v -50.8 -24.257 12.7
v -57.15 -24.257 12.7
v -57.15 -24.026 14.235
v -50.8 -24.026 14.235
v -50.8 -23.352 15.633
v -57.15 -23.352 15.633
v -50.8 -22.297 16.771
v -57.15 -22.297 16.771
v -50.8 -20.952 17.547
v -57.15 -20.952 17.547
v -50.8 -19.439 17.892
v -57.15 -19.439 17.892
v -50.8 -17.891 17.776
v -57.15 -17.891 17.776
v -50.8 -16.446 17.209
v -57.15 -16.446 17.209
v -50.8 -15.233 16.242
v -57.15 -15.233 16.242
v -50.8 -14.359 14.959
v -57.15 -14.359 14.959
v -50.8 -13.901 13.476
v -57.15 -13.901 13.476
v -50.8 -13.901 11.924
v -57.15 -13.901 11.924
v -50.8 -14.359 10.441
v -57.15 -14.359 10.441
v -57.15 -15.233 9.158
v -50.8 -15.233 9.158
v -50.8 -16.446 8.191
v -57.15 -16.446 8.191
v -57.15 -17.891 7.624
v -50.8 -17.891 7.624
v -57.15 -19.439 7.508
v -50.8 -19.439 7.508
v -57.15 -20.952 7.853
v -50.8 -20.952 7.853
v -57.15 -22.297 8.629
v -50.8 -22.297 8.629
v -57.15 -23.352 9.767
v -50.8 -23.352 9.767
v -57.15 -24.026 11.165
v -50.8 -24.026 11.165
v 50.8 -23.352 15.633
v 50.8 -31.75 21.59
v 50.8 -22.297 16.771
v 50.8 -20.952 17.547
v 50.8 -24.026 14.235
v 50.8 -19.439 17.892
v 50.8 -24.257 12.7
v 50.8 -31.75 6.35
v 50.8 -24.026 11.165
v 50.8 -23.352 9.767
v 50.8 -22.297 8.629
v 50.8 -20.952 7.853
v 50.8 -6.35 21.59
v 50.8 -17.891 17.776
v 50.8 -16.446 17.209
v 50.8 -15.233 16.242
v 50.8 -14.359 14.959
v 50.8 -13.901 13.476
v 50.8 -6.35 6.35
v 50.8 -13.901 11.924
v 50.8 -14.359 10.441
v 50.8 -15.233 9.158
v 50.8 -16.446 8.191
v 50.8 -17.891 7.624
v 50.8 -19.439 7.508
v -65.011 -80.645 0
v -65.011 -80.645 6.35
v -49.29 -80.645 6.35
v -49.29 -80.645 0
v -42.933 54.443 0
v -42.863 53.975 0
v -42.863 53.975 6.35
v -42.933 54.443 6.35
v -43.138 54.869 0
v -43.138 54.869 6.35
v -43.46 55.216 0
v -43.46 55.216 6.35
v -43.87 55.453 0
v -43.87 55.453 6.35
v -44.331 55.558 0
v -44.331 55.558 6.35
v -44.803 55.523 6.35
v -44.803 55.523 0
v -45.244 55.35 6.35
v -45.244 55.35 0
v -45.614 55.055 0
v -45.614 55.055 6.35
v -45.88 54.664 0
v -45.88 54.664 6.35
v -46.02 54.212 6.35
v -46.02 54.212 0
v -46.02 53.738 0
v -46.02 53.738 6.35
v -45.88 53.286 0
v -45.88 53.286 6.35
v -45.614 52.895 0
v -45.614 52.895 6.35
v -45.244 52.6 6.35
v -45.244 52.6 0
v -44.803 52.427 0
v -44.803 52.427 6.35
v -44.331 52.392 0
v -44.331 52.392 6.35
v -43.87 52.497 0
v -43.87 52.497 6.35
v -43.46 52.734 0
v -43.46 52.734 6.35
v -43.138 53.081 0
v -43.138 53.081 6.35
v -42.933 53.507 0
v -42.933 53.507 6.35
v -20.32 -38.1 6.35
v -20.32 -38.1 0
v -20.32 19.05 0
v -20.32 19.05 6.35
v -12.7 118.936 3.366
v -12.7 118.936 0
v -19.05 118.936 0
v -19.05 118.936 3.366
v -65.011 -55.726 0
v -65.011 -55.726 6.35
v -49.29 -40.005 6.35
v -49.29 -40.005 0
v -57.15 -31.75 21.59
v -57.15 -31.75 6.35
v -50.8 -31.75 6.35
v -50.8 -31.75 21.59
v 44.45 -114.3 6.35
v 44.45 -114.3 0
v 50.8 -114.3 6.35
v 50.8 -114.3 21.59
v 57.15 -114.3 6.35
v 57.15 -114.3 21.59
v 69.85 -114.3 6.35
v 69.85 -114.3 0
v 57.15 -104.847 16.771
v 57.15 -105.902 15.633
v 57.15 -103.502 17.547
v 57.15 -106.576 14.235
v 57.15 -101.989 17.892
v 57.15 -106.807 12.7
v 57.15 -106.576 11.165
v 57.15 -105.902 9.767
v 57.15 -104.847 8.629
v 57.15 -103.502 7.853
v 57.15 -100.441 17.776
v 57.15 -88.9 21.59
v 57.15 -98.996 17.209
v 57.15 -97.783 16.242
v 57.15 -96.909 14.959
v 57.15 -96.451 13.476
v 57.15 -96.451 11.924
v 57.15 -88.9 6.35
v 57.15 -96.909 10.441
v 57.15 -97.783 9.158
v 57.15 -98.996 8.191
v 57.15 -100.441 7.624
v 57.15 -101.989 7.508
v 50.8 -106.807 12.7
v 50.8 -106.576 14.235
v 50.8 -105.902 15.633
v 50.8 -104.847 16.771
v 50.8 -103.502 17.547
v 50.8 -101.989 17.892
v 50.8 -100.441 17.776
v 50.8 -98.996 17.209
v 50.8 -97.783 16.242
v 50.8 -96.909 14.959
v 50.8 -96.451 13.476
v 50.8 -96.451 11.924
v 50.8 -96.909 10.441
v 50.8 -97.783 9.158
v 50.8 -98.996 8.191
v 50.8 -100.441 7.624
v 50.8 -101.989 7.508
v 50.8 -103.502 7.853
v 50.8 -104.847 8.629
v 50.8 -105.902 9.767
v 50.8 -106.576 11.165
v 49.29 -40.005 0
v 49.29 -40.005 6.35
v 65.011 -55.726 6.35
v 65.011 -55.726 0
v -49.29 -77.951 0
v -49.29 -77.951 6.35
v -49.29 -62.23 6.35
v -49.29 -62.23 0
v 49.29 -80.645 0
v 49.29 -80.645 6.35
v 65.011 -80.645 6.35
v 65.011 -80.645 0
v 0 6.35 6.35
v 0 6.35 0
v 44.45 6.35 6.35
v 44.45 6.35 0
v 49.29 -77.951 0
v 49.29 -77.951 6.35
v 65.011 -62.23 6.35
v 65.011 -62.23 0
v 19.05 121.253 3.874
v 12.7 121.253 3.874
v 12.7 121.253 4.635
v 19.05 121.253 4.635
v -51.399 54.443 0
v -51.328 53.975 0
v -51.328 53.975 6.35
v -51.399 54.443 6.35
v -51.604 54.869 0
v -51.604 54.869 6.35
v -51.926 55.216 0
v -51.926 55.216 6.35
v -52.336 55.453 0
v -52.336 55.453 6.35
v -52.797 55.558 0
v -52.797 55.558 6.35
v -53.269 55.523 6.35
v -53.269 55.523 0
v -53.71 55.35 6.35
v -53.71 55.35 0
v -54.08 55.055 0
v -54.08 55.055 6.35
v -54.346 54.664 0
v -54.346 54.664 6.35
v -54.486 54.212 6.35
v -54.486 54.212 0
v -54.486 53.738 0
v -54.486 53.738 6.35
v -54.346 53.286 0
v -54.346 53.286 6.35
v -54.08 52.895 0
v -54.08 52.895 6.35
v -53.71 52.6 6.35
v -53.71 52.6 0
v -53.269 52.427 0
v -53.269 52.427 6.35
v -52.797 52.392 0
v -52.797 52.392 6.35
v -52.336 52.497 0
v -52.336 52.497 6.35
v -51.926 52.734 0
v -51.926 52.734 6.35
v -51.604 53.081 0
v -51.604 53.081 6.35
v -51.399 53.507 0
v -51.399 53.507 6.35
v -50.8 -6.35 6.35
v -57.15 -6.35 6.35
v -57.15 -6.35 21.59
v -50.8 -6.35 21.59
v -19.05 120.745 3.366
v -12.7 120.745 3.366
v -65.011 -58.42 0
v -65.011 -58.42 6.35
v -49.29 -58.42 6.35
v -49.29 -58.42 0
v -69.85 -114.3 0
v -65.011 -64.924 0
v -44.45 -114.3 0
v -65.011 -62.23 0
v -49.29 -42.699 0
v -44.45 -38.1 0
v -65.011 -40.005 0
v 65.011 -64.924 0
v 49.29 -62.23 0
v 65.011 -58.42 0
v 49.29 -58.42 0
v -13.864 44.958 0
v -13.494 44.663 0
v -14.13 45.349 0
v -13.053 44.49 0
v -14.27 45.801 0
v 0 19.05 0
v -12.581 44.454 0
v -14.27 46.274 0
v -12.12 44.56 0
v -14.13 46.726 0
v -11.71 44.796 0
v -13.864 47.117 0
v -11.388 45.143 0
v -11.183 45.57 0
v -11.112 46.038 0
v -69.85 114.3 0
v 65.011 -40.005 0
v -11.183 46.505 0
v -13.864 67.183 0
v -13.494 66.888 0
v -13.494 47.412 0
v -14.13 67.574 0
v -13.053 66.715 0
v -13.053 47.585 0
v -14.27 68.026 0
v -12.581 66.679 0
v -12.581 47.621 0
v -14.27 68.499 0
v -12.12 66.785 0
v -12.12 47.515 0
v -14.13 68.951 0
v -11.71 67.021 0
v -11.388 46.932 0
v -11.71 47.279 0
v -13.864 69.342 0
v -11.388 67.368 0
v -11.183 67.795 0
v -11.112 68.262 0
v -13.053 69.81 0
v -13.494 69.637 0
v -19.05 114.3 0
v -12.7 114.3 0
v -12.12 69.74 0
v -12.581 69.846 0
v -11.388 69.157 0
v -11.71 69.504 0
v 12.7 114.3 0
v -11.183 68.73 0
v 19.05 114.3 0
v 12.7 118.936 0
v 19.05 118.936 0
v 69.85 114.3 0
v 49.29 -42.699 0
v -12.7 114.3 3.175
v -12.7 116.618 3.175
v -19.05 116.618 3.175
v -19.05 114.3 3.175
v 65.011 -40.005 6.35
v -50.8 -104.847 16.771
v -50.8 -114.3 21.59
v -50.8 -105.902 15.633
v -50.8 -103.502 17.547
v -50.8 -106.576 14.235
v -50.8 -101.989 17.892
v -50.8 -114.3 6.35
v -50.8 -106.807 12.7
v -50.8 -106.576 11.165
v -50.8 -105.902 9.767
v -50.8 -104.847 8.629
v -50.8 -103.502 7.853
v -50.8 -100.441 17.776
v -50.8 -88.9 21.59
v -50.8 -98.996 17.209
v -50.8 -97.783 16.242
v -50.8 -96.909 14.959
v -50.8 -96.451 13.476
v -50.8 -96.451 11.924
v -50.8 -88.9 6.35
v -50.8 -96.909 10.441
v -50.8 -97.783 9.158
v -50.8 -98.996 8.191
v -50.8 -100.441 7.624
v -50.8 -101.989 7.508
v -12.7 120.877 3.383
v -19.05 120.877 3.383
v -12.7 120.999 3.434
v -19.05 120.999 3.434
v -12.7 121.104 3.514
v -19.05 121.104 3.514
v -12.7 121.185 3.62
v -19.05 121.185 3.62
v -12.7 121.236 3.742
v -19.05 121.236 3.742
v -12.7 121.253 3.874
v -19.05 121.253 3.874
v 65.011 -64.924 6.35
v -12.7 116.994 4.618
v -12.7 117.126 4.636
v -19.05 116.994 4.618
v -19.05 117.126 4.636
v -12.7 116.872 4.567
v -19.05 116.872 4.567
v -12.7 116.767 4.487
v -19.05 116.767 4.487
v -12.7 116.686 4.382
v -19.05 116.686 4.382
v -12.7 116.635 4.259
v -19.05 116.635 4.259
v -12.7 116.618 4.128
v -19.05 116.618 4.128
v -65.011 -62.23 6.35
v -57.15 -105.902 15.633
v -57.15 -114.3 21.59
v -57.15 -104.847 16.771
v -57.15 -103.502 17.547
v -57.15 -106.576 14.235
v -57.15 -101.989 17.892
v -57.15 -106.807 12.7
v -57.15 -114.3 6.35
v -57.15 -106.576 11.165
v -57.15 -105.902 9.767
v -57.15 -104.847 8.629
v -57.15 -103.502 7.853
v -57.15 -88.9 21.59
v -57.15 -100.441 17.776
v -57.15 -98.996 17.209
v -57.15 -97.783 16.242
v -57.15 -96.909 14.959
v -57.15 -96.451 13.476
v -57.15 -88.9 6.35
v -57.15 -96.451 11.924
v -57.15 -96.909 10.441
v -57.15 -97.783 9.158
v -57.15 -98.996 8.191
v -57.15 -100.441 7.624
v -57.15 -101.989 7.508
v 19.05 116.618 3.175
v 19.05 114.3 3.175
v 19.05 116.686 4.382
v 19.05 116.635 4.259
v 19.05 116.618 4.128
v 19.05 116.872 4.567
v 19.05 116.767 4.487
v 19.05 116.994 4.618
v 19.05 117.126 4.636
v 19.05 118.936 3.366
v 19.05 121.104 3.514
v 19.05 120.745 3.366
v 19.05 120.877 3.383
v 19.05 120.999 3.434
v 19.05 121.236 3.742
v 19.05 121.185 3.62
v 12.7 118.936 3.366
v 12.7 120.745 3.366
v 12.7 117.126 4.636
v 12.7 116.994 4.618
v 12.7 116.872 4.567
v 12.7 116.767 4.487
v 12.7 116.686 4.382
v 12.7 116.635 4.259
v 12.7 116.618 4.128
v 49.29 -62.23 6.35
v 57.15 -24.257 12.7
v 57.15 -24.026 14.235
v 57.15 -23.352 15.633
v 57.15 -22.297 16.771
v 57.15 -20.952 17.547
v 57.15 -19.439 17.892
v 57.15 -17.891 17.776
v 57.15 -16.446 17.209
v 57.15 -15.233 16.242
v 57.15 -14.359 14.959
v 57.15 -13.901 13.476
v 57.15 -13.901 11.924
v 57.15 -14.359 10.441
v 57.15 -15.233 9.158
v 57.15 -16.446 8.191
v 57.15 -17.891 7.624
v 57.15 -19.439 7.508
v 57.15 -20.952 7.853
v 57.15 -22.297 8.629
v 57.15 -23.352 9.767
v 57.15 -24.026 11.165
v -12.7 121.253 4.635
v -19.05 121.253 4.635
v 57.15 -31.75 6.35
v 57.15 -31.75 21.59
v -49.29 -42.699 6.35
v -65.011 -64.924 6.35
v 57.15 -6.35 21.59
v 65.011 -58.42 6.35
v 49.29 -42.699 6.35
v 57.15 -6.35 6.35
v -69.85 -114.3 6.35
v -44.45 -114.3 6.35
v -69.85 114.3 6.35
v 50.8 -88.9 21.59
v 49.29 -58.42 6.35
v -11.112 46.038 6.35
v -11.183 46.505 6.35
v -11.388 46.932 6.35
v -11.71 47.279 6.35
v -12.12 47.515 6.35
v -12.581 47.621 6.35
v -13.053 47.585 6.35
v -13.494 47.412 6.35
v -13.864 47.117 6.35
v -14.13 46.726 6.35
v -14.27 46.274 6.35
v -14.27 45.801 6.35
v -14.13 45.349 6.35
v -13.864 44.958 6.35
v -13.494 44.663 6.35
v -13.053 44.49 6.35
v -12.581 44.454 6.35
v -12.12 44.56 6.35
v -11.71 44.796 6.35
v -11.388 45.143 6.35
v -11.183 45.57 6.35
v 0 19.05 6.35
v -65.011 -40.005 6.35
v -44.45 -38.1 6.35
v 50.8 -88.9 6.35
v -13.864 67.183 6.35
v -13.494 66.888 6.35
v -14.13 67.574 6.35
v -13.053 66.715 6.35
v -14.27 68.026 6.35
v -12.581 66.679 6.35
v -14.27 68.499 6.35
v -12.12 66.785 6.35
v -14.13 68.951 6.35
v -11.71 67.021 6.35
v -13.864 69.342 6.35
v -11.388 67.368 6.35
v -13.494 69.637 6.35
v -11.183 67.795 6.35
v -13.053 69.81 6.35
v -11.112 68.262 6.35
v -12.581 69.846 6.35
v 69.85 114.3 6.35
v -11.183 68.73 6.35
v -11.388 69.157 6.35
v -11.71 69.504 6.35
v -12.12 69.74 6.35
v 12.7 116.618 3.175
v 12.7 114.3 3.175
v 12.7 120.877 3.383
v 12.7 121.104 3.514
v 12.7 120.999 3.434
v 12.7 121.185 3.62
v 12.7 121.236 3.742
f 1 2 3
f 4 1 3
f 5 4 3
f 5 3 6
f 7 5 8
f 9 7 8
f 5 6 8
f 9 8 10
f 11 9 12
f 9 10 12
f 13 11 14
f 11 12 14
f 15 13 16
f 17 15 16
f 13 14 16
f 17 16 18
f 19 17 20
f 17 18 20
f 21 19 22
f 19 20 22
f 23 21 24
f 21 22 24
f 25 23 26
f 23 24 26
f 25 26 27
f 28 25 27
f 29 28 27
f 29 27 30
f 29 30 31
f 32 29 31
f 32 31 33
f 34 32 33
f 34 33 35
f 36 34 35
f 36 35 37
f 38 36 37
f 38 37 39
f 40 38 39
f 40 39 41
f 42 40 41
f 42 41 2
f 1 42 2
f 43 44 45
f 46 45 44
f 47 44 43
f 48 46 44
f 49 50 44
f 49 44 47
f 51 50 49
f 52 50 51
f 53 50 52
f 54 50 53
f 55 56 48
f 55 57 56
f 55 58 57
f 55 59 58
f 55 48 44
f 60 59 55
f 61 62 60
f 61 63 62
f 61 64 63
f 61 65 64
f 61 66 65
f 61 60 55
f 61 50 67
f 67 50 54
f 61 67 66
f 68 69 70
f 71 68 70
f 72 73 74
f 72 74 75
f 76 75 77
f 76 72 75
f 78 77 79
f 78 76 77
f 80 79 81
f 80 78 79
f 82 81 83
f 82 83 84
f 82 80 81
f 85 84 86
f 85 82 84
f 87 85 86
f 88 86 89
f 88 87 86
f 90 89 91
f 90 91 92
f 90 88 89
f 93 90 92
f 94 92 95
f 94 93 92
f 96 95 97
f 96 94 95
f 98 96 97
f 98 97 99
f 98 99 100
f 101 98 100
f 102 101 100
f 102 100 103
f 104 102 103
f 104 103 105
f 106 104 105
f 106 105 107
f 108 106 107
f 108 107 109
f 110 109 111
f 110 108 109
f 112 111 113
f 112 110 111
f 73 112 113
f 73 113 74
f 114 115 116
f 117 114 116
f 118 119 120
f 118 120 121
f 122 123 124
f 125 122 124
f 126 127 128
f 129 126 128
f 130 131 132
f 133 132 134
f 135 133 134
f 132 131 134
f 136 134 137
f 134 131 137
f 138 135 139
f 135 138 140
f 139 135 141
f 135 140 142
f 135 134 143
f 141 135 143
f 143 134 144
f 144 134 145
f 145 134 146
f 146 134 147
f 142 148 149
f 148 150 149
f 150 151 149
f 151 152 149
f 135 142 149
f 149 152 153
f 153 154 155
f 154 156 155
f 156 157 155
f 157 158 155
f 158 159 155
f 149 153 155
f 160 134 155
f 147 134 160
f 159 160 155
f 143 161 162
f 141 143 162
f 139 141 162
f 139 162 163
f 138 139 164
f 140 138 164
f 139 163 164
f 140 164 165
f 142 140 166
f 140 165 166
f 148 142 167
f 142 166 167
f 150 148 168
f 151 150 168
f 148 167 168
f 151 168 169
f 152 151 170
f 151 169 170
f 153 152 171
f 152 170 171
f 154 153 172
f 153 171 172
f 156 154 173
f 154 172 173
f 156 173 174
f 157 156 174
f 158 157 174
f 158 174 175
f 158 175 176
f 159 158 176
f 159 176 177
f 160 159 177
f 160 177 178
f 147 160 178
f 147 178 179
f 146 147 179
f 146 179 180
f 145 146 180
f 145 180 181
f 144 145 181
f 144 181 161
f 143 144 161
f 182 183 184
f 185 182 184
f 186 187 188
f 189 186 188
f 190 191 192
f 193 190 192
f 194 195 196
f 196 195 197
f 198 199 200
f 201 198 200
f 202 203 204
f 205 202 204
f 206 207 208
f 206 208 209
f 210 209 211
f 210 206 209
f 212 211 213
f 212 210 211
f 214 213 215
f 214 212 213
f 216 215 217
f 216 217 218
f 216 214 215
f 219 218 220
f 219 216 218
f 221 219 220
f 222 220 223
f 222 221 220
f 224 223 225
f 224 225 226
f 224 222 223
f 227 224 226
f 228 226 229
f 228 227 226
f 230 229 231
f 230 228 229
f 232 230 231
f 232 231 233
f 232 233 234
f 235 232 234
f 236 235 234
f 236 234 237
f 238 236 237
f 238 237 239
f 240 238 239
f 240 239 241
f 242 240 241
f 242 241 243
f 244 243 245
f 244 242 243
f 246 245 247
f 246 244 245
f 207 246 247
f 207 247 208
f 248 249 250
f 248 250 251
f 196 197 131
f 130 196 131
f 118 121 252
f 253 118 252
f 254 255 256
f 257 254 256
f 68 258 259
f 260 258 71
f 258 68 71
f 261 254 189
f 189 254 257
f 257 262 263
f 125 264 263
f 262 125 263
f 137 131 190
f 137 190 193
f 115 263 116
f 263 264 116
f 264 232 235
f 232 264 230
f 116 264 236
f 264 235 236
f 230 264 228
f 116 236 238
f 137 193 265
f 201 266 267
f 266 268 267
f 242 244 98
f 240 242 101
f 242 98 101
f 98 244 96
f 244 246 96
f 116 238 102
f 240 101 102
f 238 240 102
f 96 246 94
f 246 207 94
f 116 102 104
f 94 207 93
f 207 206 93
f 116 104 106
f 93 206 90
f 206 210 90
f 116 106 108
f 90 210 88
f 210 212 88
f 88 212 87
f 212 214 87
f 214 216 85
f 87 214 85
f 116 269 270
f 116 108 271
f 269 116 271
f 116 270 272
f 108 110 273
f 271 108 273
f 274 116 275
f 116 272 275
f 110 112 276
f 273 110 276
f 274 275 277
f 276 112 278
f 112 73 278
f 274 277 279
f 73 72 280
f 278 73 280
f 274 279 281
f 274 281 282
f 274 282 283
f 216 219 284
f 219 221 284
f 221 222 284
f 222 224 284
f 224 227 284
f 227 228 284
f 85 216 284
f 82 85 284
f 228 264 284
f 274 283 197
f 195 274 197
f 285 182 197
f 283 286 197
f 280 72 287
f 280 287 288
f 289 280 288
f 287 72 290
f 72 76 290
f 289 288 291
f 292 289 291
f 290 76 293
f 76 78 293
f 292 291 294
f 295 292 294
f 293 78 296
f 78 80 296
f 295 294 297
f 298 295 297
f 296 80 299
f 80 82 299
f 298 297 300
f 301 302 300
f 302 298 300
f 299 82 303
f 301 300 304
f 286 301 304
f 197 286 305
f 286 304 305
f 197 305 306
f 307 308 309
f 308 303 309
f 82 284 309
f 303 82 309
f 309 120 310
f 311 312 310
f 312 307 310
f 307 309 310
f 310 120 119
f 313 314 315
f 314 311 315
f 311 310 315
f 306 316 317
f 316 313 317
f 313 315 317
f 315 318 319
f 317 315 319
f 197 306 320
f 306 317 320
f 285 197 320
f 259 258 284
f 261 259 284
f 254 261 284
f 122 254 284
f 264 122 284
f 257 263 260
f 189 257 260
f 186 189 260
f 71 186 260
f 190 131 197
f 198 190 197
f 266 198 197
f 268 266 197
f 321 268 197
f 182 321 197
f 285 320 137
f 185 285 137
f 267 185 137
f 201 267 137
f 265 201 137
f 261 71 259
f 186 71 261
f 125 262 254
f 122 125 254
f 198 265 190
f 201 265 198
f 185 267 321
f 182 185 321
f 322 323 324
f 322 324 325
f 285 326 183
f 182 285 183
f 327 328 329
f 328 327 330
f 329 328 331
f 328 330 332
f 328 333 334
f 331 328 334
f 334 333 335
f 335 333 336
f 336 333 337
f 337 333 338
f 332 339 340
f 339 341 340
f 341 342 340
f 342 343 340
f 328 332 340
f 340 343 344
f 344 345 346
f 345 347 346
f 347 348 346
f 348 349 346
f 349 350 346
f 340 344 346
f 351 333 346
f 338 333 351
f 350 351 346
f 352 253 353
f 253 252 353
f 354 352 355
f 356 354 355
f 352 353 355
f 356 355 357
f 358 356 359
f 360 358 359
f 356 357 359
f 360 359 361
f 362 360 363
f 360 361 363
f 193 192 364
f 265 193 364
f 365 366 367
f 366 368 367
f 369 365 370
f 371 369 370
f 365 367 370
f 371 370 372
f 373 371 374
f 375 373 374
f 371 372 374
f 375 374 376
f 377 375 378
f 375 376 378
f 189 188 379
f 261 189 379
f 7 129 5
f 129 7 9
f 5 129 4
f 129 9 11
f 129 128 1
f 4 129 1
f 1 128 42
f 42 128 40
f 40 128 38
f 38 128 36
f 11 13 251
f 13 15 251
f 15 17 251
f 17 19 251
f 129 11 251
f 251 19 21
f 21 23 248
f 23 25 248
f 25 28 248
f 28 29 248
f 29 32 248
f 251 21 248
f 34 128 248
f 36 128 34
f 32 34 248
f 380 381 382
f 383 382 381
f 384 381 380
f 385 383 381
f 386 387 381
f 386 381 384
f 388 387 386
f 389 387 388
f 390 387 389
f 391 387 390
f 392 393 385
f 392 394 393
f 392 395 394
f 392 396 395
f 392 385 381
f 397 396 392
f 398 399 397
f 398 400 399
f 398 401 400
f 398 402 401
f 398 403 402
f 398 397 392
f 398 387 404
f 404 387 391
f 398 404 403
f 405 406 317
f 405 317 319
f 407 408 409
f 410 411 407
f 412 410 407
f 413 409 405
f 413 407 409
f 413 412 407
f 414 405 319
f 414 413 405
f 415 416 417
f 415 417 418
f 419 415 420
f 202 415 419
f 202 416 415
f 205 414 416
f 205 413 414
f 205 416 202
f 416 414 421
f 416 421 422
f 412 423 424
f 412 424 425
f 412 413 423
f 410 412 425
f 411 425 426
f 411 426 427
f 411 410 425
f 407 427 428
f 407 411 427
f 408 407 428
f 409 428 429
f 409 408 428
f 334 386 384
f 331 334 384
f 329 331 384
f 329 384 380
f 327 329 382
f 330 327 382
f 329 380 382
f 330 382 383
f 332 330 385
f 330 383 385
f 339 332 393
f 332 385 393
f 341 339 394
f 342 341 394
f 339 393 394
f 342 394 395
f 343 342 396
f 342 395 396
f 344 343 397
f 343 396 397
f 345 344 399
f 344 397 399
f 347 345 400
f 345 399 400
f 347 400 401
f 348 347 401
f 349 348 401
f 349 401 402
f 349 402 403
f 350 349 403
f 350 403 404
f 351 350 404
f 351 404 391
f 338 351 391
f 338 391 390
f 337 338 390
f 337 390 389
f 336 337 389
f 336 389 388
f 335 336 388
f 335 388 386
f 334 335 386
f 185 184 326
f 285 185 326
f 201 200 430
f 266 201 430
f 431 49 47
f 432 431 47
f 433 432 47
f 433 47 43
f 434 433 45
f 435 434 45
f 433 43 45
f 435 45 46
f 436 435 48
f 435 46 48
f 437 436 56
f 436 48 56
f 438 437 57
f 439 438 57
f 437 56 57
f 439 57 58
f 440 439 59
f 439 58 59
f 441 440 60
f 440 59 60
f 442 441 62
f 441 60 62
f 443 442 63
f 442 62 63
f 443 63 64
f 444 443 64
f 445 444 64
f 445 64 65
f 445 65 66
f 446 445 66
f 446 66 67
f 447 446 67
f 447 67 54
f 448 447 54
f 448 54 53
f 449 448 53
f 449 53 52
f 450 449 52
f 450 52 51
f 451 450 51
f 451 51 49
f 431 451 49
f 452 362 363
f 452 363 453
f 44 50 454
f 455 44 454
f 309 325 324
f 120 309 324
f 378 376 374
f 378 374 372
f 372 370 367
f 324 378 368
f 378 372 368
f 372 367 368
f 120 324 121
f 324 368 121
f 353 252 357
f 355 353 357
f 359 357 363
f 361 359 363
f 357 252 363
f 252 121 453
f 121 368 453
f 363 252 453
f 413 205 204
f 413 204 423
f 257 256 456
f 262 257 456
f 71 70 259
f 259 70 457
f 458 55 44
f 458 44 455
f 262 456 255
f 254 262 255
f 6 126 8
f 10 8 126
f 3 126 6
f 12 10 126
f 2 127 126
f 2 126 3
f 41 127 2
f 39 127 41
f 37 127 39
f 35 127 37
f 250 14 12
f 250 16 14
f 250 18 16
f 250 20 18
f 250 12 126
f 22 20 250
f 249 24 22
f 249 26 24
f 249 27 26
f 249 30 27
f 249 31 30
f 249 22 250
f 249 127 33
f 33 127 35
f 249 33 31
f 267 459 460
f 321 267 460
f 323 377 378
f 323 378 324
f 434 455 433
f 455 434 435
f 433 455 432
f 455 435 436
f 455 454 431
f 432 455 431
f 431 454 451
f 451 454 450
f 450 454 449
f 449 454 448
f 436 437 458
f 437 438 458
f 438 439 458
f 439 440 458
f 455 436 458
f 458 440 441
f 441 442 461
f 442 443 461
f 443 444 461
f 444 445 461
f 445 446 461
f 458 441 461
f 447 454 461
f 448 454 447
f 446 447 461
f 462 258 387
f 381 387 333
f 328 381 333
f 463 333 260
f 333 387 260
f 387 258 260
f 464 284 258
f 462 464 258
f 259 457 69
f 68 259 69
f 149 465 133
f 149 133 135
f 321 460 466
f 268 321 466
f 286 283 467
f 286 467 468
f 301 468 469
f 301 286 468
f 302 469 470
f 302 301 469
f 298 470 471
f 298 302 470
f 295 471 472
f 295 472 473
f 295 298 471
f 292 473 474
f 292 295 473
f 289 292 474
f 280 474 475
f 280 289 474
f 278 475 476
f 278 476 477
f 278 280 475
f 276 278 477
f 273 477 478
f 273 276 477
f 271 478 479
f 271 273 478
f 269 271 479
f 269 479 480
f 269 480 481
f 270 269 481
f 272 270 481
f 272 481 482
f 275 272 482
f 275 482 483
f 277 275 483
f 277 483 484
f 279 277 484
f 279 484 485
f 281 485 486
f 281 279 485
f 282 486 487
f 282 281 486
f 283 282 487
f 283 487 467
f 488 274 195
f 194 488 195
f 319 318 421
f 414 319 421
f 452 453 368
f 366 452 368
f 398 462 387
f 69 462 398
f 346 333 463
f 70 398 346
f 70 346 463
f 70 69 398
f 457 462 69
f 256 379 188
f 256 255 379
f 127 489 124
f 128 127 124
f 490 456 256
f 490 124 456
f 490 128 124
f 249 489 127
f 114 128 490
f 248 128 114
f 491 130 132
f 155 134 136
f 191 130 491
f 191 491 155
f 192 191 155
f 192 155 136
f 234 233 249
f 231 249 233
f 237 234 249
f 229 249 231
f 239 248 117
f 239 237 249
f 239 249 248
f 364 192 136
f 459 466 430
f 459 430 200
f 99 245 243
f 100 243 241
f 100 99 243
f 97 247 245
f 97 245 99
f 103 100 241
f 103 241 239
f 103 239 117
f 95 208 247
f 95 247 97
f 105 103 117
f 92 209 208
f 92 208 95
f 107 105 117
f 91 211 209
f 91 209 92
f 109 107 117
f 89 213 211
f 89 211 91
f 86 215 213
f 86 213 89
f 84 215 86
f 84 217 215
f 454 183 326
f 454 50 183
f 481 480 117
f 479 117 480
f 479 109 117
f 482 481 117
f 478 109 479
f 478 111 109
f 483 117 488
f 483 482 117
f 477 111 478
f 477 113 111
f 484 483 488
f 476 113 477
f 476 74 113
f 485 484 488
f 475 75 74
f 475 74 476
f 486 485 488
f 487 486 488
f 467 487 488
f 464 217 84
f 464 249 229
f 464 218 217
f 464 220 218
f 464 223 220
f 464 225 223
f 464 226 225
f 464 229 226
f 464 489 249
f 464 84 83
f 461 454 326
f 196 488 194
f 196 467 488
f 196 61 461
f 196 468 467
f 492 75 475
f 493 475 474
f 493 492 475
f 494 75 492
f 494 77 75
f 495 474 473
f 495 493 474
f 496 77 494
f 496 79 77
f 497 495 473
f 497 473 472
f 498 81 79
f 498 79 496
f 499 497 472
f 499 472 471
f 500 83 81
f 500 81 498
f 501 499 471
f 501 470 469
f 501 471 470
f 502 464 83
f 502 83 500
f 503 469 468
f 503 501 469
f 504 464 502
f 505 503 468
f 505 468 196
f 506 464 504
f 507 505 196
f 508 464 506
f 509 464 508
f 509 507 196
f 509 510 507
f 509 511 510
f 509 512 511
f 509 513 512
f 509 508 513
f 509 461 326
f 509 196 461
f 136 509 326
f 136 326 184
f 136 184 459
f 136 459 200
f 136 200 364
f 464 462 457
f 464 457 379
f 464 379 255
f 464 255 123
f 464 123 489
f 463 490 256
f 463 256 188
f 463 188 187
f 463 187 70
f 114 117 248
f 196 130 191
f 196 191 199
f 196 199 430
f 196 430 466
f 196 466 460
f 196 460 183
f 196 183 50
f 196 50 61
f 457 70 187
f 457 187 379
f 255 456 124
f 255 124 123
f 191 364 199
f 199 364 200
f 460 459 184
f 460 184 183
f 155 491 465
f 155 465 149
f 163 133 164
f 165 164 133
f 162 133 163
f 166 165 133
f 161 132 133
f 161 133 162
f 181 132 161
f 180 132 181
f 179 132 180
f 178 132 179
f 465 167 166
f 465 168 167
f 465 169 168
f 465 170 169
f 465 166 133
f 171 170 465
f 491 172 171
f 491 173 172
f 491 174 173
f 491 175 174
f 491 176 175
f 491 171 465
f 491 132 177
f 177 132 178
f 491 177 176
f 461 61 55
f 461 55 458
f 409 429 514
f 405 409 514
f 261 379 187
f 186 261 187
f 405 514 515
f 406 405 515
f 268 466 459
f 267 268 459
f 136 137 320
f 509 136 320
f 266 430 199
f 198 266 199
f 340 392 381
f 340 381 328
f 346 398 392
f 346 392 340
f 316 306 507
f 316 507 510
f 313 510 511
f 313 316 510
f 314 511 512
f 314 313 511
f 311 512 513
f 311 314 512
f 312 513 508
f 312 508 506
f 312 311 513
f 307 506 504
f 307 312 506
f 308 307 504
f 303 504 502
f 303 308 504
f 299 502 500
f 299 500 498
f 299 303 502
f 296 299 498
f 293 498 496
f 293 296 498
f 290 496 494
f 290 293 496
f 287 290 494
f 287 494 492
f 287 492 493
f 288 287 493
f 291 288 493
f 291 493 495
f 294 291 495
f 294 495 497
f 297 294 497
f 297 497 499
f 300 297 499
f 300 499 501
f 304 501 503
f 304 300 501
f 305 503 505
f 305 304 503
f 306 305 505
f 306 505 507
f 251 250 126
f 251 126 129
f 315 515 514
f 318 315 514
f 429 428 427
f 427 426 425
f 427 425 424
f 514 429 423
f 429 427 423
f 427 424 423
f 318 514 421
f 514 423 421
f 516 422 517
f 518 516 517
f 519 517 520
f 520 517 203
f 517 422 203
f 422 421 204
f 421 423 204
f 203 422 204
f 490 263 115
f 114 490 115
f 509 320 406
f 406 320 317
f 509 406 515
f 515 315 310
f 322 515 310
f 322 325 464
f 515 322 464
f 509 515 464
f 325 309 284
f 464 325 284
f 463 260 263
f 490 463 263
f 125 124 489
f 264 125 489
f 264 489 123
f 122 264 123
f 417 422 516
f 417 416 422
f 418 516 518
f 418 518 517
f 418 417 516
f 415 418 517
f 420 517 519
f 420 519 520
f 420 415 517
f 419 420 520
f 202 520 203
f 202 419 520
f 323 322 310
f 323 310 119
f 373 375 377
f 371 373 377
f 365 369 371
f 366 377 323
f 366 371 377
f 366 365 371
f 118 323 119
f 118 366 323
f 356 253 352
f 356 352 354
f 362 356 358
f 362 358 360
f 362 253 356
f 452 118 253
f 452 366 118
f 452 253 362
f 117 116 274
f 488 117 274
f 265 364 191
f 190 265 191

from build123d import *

# Parameters (mm, degrees)
F0_R      = 1.5875
F1_DEPTH  = 6.35
F2_W      = 6.35
F2_H      = 25.4
F3_DEPTH  = 15.24
F5_D      = 10.414
F8_W      = 2.31775
F8_H      = 1.27
F9_DEPTH  = 6.35
F11_W     = 2.31775
F11_H     = 1.27
F12_DEPTH = 6.35
F13_R     = 0.508
F15_DEPTH = 25.4


with BuildPart() as f1:
    # F0 (on Top) → F1 (new body)
    with BuildSketch(Plane.XY):
        Polygon((69.85, 114.3), (-69.85, 114.3), (-69.85, -114.3), (-44.45, -114.3), (-44.45, -107.95), (-44.45, -38.1), (-20.32, -38.1), (-20.32, 19.05), (0, 19.05), (0, 6.35), (44.45, 6.35), (44.45, -38.1), (44.45, -88.9), (44.45, -95.25), (44.45, -114.3), (69.85, -114.3), align=None)
        with Locations((-52.91582, 53.975)):
            Circle(F0_R, mode=Mode.SUBTRACT)
        with Locations((-44.45, 53.975)):
            Circle(F0_R, mode=Mode.SUBTRACT)
        with Locations((-12.7, 46.0375)):
            Circle(F0_R, mode=Mode.SUBTRACT)
        with Locations((-12.7, 68.2625)):
            Circle(F0_R, mode=Mode.SUBTRACT)
    extrude(amount=F1_DEPTH)

    # F2 (on face) → F3 (join)
    with BuildSketch(Plane.XY.offset(6.35)):
        with Locations((-53.975, -101.6)):
            Rectangle(F2_W, F2_H)
        with Locations((53.975, -101.6)):
            Rectangle(F2_W, F2_H)
        with Locations((-53.975, -19.05)):
            Rectangle(F2_W, F2_H)
        with Locations((53.975, -19.05)):
            Rectangle(F2_W, F2_H)
    extrude(amount=F3_DEPTH)

    # F5 (through all)
    with Locations(Plane.YZ.offset(57.15)):
        with Locations((-101.6, 12.7), (-19.05, 12.7)):
            Hole(F5_D / 2)

    # F8 (on offset) → F9 (join)
    with BuildSketch(Plane.YZ.offset(12.7)):
        with Locations((120.094375, 4.0005)):
            Rectangle(F8_W, F8_H)
        Polygon((118.9355, 3.3655), (118.9355, 4.6355), (116.61775, 4.6355), (116.61775, 3.175), (114.3, 3.175), (114.3, 0), (118.9355, 0), align=None)
    extrude(amount=F9_DEPTH)

    # F11 (on offset) → F12 (join)
    with BuildSketch(Plane.YZ.offset(-12.7)):
        with Locations((120.094375, 4.0005)):
            Rectangle(F11_W, F11_H)
        Polygon((118.9355, 3.3655), (118.9355, 4.6355), (116.61775, 4.6355), (116.61775, 3.175), (114.3, 3.175), (114.3, 0), (118.9355, 0), align=None)
    extrude(amount=-F12_DEPTH)

    # F13
    f13_edges = [f1.edges().sort_by_distance(p)[0] for p in [
        (15.875, 121.25325, 3.3655),
        (-15.875, 121.25325, 3.3655),
        (-15.875, 116.61775, 4.6355),
        (15.875, 116.61775, 4.6355),
    ]]
    fillet(f13_edges, radius=F13_R)

    # F14 (on face) → F15 (cut)
    with BuildSketch(Plane.XY.offset(6.35)):
        Polygon((-49.2903768363, -40.005), (-65.0113, -40.005), (-65.0113, -55.7259231637), align=None)
        Polygon((-49.2903768363, -58.42), (-49.2903768363, -42.6990768363), (-65.0113, -58.42), align=None)
        Polygon((-49.2903768363, -62.23), (-65.0113, -62.23), (-49.2903768363, -77.9509231637), align=None)
        Polygon((-65.0113, -64.9240768363), (-65.0113, -80.645), (-49.2903768363, -80.645), align=None)
        Polygon((65.0113, -64.9240768363), (49.2903768363, -80.645), (65.0113, -80.645), align=None)
        Polygon((49.2903768363, -77.9509231637), (65.0113, -62.23), (49.2903768363, -62.23), align=None)
        Polygon((65.0113, -58.42), (49.2903768363, -42.6990768363), (49.2903768363, -58.42), align=None)
        Polygon((49.2903768363, -40.005), (65.0113, -55.7259231637), (65.0113, -40.005), align=None)
    extrude(amount=-F15_DEPTH, mode=Mode.SUBTRACT)


solid = f1.part
